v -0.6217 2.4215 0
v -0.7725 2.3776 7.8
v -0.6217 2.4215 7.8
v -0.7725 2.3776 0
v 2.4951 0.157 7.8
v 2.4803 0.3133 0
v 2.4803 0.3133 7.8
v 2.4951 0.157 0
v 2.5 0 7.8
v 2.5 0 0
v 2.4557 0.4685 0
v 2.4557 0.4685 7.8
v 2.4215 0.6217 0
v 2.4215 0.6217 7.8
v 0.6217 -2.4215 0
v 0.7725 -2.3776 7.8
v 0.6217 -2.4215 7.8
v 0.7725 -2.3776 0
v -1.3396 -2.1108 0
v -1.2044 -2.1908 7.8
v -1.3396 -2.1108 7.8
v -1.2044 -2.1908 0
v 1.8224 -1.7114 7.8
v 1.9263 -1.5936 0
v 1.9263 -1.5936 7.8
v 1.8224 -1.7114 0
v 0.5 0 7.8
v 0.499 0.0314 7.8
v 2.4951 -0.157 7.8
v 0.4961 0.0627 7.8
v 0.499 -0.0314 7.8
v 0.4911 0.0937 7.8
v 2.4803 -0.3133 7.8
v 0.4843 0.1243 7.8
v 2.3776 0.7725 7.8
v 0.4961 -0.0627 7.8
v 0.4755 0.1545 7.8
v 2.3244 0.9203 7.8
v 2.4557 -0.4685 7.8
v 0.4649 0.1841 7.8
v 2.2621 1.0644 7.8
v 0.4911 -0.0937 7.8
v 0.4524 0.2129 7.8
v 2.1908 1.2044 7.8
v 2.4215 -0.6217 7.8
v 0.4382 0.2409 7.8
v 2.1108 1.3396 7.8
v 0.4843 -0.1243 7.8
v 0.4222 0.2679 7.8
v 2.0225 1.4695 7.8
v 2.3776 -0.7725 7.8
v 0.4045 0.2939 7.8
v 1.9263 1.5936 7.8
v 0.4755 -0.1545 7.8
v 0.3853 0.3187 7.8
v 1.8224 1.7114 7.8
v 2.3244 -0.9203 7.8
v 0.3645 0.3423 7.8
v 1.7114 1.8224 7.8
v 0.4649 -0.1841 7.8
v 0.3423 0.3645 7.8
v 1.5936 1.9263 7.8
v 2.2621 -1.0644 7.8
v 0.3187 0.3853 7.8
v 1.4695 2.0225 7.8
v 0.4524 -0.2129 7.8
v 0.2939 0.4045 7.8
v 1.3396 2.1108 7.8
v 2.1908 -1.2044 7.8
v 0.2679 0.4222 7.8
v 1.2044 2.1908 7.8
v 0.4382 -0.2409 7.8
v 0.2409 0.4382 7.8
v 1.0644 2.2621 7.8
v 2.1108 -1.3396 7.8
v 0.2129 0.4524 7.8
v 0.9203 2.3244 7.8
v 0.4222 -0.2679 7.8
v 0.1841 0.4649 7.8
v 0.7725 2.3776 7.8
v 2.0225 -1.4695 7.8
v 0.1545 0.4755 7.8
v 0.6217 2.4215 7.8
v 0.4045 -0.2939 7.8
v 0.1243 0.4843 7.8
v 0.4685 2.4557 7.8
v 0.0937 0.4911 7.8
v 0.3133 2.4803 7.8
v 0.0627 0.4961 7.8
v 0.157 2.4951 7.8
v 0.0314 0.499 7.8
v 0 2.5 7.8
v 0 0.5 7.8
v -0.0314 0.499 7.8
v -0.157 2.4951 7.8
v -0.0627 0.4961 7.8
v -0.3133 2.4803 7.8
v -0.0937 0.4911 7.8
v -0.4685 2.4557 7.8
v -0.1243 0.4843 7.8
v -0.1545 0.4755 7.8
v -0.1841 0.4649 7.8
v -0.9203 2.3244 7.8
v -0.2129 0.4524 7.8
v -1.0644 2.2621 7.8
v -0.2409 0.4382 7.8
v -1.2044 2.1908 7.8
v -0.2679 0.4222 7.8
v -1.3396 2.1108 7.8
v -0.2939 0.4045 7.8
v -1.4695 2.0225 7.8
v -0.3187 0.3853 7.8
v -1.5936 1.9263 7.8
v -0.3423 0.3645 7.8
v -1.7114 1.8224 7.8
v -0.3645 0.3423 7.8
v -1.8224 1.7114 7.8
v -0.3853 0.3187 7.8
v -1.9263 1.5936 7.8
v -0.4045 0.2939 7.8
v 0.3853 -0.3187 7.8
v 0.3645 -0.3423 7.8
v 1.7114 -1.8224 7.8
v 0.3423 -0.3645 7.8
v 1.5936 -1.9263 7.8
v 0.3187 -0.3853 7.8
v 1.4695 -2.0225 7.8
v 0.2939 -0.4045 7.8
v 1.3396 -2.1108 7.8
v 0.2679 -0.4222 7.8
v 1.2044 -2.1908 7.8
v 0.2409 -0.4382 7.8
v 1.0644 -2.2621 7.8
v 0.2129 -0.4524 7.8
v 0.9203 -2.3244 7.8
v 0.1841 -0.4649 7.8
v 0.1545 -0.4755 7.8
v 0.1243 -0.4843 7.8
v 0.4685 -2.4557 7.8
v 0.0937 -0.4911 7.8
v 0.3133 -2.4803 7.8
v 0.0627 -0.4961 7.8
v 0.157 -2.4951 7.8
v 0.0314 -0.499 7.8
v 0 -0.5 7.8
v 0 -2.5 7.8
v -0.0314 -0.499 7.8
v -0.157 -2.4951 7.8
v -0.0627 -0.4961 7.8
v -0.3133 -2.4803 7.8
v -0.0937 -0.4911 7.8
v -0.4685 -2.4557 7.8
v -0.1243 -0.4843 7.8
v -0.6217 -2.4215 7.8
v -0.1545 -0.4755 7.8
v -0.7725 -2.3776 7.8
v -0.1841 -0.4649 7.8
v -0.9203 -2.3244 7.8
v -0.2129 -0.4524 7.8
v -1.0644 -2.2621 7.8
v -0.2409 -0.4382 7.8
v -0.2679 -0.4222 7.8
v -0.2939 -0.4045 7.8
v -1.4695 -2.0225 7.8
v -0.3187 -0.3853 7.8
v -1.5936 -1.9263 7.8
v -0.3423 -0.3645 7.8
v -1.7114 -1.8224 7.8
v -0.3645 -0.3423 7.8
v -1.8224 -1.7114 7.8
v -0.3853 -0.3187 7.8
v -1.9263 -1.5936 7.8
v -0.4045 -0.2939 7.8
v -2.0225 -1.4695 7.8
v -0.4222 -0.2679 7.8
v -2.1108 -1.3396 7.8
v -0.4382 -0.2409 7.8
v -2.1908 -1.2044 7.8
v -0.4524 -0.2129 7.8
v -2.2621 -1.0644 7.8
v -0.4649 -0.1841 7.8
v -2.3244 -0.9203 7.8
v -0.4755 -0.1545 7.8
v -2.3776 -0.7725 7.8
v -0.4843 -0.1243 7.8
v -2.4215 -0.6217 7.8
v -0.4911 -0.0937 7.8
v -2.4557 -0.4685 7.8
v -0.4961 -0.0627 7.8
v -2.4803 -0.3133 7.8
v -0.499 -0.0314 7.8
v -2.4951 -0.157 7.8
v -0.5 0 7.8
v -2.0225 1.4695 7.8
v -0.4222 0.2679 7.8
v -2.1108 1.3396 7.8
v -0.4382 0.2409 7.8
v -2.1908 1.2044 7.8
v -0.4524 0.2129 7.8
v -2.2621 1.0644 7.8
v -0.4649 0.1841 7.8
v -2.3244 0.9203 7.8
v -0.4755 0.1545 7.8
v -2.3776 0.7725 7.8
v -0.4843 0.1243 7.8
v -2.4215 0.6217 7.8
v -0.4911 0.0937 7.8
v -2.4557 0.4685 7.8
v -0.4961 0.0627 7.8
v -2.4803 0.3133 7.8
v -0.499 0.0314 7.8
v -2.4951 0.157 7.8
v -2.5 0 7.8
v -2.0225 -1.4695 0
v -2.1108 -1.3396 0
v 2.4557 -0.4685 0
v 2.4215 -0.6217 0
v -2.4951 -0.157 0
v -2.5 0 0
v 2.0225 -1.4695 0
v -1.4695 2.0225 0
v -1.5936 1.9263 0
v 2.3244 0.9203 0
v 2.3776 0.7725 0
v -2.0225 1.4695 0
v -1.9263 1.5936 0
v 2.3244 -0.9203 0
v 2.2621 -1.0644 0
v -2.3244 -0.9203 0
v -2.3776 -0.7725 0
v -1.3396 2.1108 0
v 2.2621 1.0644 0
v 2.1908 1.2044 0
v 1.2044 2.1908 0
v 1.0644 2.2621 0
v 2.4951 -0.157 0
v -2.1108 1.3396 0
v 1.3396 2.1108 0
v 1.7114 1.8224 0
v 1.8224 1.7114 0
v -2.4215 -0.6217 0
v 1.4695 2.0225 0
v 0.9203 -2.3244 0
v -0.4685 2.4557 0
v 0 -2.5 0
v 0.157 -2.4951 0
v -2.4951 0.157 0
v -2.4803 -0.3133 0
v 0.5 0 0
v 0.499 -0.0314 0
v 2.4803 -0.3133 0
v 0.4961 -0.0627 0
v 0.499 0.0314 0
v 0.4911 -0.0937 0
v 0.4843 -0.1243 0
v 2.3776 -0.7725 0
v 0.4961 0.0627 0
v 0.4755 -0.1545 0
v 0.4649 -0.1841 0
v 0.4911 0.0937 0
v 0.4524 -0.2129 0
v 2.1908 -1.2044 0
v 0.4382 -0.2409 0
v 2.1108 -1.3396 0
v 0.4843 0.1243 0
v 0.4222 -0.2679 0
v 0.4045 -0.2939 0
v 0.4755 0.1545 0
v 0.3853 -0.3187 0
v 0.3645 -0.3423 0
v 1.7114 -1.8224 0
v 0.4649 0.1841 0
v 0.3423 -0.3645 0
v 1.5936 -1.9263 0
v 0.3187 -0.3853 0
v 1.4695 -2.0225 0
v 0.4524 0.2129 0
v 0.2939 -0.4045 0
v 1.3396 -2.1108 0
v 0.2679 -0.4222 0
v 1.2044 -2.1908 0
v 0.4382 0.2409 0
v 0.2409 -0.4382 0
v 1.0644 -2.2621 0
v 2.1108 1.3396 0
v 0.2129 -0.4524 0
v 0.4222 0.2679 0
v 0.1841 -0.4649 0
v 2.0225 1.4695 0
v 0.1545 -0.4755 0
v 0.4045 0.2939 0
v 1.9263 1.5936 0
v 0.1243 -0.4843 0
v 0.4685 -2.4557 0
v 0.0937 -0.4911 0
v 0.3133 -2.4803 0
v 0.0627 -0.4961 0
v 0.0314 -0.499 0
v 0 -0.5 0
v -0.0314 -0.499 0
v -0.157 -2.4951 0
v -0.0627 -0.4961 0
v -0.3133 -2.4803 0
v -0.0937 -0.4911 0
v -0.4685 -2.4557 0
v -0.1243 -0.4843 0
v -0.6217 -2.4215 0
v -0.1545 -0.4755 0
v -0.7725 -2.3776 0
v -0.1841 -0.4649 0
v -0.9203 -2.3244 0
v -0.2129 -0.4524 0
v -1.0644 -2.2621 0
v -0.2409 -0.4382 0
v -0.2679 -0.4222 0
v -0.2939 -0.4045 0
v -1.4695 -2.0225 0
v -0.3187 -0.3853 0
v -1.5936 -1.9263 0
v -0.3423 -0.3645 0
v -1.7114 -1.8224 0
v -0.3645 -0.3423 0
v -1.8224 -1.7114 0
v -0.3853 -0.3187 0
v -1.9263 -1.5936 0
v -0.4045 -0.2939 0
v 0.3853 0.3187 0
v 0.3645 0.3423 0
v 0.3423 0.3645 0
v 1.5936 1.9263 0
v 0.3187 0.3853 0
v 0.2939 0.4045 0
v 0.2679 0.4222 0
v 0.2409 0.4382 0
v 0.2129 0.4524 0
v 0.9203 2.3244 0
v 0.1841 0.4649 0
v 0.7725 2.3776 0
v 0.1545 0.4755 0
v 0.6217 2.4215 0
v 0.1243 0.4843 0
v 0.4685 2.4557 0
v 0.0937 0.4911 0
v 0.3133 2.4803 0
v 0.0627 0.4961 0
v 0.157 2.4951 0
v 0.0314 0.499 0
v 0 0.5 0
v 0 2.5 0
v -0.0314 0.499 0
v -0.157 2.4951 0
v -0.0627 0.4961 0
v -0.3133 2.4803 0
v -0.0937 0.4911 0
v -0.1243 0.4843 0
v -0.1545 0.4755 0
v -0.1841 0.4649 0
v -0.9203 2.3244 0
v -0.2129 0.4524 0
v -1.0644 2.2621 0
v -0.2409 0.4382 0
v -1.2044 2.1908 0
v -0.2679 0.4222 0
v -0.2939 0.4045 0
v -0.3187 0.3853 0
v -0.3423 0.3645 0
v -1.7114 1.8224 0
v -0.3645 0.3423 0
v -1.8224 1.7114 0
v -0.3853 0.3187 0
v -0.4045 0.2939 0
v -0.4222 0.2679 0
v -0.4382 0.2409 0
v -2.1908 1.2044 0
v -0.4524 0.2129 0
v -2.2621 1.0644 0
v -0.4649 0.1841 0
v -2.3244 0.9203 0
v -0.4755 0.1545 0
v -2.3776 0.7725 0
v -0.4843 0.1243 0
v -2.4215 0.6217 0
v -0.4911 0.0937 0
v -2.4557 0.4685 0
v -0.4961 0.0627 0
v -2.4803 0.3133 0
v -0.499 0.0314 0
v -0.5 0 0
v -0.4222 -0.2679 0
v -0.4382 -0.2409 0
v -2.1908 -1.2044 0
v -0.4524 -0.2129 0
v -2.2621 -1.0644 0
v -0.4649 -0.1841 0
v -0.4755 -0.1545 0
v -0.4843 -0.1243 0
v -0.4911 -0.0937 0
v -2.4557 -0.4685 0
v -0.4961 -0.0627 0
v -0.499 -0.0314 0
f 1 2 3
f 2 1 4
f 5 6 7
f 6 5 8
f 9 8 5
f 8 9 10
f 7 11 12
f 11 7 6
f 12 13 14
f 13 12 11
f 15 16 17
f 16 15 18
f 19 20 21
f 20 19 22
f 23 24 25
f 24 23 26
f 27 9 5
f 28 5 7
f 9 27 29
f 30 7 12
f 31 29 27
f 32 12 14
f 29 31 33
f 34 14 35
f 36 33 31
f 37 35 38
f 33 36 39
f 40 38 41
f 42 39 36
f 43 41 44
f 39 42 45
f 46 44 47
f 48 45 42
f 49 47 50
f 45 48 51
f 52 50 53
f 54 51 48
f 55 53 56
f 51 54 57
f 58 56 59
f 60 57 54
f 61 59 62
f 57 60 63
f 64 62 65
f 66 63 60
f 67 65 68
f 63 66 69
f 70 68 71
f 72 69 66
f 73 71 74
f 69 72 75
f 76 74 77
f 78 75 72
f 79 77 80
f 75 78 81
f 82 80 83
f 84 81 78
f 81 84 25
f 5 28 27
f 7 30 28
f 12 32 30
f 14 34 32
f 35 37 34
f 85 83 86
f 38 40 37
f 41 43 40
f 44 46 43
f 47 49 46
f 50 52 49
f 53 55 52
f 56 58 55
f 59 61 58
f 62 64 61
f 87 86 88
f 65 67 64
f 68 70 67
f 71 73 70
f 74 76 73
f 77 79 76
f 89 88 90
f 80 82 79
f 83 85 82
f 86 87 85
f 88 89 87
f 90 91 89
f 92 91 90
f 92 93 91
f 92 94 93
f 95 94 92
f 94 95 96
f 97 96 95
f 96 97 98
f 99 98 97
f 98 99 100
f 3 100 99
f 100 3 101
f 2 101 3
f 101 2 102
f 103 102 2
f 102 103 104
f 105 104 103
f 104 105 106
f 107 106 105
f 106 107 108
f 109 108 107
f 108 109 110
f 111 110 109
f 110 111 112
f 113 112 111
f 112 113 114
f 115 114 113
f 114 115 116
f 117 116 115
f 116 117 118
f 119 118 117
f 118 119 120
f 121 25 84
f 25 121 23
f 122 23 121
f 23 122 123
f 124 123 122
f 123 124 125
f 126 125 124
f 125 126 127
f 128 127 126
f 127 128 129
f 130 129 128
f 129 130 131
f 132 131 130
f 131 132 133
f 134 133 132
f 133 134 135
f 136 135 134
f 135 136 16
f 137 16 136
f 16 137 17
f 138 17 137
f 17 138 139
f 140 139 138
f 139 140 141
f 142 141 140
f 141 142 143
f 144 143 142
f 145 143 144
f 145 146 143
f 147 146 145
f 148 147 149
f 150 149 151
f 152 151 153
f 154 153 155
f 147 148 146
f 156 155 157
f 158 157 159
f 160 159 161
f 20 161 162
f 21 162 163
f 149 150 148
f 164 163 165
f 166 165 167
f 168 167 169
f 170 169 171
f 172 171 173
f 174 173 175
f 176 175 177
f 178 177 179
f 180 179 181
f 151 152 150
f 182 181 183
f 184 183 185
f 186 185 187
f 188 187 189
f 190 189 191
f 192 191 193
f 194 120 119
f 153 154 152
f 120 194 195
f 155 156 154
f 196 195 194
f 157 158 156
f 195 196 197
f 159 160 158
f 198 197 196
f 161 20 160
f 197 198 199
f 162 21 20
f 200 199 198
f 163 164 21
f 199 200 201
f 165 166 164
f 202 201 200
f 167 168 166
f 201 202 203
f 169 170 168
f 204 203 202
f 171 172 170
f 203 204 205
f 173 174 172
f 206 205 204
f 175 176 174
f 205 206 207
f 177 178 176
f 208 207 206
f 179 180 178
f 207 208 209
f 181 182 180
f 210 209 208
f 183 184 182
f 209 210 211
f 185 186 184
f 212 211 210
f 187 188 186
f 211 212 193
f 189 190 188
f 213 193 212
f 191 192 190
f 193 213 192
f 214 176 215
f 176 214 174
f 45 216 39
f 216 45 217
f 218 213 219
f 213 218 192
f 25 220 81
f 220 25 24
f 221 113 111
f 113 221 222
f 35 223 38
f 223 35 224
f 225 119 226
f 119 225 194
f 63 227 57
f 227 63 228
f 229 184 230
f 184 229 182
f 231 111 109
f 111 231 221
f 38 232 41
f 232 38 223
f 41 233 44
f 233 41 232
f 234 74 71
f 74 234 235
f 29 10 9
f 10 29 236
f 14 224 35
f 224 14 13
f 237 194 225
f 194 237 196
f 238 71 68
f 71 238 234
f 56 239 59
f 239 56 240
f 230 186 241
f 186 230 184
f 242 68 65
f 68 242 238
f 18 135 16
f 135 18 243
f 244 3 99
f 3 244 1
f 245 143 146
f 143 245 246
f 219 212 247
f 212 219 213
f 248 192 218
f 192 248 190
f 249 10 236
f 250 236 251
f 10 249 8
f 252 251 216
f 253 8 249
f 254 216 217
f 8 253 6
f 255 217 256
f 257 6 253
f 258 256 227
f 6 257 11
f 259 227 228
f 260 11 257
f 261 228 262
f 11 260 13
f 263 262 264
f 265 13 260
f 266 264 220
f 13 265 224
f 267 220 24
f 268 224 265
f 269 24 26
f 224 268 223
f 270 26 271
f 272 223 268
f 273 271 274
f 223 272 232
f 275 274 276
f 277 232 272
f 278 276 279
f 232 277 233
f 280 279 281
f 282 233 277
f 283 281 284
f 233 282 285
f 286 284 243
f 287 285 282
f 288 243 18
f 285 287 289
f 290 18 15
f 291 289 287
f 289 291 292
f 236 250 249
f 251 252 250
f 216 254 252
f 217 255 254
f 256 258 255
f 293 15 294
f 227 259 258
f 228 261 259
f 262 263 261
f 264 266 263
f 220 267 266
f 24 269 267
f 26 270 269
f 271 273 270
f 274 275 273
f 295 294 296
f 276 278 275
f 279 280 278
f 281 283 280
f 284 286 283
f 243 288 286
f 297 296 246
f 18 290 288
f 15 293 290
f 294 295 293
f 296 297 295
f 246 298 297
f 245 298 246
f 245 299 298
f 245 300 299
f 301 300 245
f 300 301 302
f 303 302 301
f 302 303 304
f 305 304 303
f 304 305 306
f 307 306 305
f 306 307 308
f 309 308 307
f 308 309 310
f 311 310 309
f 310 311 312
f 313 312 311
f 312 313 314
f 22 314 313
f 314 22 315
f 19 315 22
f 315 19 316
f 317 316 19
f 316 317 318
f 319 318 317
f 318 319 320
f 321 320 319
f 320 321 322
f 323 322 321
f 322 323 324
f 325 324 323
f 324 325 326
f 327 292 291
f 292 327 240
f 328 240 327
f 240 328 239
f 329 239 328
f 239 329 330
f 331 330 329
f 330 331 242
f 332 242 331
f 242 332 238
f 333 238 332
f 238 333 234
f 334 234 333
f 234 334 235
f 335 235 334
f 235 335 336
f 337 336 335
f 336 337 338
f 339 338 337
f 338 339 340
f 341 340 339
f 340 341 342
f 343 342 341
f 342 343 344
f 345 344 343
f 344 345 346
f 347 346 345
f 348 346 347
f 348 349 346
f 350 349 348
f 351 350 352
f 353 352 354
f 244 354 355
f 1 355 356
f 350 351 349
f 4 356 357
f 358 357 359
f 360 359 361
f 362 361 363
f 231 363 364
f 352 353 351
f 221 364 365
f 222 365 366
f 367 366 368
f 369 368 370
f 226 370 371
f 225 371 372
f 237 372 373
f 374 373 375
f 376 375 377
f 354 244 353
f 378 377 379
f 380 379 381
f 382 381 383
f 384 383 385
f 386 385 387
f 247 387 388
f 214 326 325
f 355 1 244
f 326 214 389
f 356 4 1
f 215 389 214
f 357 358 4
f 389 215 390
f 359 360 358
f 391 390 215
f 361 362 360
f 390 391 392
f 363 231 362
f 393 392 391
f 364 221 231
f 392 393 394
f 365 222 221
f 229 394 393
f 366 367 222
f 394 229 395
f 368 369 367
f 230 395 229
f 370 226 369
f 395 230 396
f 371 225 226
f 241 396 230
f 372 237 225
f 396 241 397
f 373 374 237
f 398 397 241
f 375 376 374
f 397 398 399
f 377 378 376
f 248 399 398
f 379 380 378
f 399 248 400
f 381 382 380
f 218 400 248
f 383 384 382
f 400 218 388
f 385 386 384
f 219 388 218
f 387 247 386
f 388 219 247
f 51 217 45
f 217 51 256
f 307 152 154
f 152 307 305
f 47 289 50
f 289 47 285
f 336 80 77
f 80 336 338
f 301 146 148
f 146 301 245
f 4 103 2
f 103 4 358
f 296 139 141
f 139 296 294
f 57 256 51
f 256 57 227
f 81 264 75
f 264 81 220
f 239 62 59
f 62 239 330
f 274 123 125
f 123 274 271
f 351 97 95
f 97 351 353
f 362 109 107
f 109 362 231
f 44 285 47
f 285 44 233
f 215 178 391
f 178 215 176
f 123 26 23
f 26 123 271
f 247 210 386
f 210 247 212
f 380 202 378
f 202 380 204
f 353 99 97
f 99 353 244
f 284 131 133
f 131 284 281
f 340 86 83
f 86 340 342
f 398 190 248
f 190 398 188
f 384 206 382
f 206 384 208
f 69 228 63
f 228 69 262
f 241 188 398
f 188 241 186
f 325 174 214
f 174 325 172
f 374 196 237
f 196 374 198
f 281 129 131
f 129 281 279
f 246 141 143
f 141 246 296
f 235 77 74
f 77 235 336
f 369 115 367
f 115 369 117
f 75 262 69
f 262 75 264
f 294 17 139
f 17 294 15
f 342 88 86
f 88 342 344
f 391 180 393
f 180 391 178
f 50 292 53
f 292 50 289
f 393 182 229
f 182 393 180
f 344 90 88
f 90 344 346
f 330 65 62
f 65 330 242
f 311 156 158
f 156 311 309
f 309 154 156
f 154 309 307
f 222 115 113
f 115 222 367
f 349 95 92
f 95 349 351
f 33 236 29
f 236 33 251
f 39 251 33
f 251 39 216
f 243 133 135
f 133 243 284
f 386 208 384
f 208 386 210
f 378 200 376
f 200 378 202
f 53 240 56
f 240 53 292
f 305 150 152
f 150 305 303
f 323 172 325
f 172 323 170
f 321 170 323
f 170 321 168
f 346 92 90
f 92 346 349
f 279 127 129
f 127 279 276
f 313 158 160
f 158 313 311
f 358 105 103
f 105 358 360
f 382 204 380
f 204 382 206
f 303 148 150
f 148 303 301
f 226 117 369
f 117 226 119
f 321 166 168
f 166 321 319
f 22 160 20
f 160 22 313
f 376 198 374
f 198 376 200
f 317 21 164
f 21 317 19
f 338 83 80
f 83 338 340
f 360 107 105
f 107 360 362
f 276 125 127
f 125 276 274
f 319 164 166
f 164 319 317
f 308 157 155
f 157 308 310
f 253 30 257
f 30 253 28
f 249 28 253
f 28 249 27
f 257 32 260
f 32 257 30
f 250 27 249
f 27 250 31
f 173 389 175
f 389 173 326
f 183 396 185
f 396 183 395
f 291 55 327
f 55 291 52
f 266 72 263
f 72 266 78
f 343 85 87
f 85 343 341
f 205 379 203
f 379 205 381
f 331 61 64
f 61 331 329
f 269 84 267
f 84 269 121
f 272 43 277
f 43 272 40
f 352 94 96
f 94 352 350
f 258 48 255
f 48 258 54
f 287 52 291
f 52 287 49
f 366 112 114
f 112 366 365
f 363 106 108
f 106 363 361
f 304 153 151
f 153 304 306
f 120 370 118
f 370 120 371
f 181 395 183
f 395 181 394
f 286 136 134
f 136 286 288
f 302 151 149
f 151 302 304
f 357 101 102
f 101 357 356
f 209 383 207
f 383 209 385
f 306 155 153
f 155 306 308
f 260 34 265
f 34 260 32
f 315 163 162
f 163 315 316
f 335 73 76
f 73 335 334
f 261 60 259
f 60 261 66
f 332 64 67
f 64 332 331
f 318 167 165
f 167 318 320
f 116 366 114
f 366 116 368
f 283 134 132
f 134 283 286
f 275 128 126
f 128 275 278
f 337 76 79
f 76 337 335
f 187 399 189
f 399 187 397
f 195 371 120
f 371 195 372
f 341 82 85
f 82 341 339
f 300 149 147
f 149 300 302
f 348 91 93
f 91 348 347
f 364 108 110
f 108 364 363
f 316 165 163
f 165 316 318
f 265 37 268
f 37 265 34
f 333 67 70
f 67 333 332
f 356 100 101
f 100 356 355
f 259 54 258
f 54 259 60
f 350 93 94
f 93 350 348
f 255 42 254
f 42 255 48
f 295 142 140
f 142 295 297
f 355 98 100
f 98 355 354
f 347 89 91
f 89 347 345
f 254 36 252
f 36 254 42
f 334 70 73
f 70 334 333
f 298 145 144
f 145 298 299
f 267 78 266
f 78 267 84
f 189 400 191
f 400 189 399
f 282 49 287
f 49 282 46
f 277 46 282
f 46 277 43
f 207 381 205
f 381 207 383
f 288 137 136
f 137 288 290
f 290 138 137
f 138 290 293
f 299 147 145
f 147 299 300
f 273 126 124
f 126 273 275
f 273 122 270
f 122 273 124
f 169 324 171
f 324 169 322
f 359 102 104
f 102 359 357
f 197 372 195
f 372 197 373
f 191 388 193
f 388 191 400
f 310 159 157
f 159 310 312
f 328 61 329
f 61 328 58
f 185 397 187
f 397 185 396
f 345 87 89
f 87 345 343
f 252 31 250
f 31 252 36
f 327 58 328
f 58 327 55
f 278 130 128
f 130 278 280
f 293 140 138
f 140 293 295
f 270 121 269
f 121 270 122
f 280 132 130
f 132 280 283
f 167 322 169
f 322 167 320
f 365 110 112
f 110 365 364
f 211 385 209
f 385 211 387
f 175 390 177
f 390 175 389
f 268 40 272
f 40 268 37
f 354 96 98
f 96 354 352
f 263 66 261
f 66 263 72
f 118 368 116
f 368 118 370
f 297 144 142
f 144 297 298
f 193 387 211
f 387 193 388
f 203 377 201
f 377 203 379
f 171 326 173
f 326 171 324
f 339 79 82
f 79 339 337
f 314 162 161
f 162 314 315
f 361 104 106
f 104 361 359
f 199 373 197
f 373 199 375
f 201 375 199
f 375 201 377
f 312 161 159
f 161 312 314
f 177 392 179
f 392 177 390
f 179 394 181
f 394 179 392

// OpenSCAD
$fa = 6;
$fs = 0.2;
$fn = 100;

d_centre=1;
d_axe=5;
d_tete=8;
h_axe=7.8;
h_tete=0;

difference() {
    union() {
	cylinder(d = d_tete, h=h_tete);
        cylinder(d = d_axe, h=h_tete+h_axe);
    };
    translate([0,0,-1]) cylinder(d = d_centre, h=h_tete+h_axe+2);
};
